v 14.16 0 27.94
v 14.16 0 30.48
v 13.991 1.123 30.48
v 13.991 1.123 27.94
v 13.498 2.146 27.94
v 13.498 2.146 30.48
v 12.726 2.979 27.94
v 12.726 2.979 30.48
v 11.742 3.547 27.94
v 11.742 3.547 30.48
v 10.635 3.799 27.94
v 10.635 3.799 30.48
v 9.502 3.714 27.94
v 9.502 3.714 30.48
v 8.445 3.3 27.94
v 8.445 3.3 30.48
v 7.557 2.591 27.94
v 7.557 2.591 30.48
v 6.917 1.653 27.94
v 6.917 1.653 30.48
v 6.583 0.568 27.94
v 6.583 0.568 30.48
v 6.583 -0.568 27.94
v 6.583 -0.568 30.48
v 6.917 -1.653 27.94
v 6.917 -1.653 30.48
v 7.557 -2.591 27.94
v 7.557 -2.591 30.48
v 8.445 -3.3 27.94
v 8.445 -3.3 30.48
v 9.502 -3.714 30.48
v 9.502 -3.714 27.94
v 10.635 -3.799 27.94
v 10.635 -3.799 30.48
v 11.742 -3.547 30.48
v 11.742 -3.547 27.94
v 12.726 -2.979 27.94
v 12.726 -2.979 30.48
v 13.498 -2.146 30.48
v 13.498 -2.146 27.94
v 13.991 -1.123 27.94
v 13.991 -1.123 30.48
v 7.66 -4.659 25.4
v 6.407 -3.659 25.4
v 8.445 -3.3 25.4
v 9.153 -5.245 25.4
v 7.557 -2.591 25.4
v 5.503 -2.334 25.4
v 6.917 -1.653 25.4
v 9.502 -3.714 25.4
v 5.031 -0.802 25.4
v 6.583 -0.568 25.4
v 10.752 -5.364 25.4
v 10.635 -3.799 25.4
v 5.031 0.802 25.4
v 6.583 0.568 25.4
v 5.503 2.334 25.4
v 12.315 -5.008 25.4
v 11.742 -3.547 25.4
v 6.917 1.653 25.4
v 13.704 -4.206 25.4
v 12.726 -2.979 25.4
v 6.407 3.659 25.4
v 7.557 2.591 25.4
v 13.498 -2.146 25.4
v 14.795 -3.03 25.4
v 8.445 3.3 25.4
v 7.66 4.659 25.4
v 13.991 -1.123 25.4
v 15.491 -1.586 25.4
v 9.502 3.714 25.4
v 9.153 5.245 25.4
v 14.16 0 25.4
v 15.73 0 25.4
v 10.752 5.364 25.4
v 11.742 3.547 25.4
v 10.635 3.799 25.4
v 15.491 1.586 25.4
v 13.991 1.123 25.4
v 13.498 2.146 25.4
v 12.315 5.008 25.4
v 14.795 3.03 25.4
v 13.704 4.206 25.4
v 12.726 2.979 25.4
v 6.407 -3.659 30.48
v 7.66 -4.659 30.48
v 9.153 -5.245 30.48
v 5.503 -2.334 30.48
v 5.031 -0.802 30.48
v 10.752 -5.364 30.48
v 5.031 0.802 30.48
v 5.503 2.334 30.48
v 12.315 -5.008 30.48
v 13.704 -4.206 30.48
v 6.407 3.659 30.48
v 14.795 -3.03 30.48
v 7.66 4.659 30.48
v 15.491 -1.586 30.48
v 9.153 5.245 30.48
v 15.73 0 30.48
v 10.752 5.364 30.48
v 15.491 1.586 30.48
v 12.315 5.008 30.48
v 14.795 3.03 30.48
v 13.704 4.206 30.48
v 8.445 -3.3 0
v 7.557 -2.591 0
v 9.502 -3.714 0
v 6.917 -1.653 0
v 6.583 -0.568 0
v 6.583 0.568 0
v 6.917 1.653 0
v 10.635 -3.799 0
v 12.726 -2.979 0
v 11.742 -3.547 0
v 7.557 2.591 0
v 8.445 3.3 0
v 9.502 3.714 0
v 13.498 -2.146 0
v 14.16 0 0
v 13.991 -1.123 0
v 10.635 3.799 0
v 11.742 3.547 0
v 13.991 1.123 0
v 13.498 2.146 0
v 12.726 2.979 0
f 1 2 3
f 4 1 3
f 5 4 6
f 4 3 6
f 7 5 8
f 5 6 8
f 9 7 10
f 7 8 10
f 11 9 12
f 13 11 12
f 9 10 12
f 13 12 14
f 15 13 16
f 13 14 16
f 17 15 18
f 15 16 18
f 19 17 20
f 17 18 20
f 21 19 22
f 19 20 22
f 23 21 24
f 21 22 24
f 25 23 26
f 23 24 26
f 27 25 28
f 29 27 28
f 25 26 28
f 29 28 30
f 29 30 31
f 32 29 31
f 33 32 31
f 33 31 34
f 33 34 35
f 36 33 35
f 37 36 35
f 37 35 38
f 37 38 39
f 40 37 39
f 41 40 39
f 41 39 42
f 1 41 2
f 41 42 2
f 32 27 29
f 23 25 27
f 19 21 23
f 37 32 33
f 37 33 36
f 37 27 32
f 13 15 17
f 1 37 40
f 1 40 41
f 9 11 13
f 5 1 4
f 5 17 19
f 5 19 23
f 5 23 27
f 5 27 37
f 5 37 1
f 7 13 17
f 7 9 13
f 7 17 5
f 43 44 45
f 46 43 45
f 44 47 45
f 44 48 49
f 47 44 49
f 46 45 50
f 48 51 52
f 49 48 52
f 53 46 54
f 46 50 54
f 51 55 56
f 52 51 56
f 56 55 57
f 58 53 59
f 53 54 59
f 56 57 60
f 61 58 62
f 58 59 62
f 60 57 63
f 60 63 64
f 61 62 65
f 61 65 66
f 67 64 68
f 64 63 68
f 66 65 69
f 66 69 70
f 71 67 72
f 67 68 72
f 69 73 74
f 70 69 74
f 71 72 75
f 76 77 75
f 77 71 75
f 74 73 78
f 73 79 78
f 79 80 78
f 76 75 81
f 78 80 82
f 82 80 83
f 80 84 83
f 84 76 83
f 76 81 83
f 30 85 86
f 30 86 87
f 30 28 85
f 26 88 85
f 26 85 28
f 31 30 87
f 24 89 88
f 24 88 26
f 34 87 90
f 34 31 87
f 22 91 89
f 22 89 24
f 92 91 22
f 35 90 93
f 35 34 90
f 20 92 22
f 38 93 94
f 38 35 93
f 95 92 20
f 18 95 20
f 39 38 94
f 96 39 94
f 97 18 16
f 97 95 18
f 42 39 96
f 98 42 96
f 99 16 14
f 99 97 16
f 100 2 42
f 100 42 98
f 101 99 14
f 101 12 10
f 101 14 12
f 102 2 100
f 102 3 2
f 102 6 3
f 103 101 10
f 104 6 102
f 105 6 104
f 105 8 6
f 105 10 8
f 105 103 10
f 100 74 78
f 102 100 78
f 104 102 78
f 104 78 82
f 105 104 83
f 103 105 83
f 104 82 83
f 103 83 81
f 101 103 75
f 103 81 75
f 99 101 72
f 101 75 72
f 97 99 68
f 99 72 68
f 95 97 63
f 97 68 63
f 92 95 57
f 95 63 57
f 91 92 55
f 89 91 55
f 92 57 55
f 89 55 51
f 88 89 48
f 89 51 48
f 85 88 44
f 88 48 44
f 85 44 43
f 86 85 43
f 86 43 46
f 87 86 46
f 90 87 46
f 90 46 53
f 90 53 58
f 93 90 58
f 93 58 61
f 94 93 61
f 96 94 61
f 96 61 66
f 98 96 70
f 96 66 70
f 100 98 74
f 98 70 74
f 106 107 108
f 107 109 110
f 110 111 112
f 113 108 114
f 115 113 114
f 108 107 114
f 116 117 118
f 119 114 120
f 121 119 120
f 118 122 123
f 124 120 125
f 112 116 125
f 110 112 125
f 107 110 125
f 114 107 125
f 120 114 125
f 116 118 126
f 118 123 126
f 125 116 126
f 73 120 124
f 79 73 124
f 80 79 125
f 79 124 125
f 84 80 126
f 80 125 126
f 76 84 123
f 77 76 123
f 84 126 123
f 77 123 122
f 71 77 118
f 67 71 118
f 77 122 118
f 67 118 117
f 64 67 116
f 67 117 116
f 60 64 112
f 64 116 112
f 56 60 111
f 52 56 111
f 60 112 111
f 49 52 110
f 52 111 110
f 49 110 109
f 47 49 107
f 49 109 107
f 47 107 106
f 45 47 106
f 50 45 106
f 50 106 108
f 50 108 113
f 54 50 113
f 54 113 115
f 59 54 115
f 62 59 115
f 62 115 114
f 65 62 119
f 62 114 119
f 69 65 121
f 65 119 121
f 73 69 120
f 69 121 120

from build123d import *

# Parameters (mm, degrees)
F0_R     = 3.81
F1_DEPTH = 25.4
F2_R     = 5.3793870979
F2_R_2   = 3.81
F3_DEPTH = 5.08
F4_R     = 3.81
F5_DEPTH = 2.54


with BuildPart() as f1:
    # F0 (on Top) → F1 (new body)
    with BuildSketch(Plane.XY):
        with Locations((10.3501314297, 0)):
            Circle(F0_R)
    extrude(amount=F1_DEPTH)

    # F2 (on face) → F3 (join)
    with BuildSketch(Plane.XY.offset(25.4)):
        with Locations((10.3501314297, 0)):
            Circle(F2_R)
        with Locations((10.3501314297, 0)):
            Circle(F2_R_2, mode=Mode.SUBTRACT)
        with Locations((10.3501314297, 0)):
            Circle(F2_R_2)
    extrude(amount=F3_DEPTH)

    # F4 (on face) → F5 (cut)
    with BuildSketch(Plane.XY.offset(30.48)):
        with Locations((10.3501314297, 0)):
            Circle(F4_R)
    extrude(amount=-F5_DEPTH, mode=Mode.SUBTRACT)


solid = f1.part
